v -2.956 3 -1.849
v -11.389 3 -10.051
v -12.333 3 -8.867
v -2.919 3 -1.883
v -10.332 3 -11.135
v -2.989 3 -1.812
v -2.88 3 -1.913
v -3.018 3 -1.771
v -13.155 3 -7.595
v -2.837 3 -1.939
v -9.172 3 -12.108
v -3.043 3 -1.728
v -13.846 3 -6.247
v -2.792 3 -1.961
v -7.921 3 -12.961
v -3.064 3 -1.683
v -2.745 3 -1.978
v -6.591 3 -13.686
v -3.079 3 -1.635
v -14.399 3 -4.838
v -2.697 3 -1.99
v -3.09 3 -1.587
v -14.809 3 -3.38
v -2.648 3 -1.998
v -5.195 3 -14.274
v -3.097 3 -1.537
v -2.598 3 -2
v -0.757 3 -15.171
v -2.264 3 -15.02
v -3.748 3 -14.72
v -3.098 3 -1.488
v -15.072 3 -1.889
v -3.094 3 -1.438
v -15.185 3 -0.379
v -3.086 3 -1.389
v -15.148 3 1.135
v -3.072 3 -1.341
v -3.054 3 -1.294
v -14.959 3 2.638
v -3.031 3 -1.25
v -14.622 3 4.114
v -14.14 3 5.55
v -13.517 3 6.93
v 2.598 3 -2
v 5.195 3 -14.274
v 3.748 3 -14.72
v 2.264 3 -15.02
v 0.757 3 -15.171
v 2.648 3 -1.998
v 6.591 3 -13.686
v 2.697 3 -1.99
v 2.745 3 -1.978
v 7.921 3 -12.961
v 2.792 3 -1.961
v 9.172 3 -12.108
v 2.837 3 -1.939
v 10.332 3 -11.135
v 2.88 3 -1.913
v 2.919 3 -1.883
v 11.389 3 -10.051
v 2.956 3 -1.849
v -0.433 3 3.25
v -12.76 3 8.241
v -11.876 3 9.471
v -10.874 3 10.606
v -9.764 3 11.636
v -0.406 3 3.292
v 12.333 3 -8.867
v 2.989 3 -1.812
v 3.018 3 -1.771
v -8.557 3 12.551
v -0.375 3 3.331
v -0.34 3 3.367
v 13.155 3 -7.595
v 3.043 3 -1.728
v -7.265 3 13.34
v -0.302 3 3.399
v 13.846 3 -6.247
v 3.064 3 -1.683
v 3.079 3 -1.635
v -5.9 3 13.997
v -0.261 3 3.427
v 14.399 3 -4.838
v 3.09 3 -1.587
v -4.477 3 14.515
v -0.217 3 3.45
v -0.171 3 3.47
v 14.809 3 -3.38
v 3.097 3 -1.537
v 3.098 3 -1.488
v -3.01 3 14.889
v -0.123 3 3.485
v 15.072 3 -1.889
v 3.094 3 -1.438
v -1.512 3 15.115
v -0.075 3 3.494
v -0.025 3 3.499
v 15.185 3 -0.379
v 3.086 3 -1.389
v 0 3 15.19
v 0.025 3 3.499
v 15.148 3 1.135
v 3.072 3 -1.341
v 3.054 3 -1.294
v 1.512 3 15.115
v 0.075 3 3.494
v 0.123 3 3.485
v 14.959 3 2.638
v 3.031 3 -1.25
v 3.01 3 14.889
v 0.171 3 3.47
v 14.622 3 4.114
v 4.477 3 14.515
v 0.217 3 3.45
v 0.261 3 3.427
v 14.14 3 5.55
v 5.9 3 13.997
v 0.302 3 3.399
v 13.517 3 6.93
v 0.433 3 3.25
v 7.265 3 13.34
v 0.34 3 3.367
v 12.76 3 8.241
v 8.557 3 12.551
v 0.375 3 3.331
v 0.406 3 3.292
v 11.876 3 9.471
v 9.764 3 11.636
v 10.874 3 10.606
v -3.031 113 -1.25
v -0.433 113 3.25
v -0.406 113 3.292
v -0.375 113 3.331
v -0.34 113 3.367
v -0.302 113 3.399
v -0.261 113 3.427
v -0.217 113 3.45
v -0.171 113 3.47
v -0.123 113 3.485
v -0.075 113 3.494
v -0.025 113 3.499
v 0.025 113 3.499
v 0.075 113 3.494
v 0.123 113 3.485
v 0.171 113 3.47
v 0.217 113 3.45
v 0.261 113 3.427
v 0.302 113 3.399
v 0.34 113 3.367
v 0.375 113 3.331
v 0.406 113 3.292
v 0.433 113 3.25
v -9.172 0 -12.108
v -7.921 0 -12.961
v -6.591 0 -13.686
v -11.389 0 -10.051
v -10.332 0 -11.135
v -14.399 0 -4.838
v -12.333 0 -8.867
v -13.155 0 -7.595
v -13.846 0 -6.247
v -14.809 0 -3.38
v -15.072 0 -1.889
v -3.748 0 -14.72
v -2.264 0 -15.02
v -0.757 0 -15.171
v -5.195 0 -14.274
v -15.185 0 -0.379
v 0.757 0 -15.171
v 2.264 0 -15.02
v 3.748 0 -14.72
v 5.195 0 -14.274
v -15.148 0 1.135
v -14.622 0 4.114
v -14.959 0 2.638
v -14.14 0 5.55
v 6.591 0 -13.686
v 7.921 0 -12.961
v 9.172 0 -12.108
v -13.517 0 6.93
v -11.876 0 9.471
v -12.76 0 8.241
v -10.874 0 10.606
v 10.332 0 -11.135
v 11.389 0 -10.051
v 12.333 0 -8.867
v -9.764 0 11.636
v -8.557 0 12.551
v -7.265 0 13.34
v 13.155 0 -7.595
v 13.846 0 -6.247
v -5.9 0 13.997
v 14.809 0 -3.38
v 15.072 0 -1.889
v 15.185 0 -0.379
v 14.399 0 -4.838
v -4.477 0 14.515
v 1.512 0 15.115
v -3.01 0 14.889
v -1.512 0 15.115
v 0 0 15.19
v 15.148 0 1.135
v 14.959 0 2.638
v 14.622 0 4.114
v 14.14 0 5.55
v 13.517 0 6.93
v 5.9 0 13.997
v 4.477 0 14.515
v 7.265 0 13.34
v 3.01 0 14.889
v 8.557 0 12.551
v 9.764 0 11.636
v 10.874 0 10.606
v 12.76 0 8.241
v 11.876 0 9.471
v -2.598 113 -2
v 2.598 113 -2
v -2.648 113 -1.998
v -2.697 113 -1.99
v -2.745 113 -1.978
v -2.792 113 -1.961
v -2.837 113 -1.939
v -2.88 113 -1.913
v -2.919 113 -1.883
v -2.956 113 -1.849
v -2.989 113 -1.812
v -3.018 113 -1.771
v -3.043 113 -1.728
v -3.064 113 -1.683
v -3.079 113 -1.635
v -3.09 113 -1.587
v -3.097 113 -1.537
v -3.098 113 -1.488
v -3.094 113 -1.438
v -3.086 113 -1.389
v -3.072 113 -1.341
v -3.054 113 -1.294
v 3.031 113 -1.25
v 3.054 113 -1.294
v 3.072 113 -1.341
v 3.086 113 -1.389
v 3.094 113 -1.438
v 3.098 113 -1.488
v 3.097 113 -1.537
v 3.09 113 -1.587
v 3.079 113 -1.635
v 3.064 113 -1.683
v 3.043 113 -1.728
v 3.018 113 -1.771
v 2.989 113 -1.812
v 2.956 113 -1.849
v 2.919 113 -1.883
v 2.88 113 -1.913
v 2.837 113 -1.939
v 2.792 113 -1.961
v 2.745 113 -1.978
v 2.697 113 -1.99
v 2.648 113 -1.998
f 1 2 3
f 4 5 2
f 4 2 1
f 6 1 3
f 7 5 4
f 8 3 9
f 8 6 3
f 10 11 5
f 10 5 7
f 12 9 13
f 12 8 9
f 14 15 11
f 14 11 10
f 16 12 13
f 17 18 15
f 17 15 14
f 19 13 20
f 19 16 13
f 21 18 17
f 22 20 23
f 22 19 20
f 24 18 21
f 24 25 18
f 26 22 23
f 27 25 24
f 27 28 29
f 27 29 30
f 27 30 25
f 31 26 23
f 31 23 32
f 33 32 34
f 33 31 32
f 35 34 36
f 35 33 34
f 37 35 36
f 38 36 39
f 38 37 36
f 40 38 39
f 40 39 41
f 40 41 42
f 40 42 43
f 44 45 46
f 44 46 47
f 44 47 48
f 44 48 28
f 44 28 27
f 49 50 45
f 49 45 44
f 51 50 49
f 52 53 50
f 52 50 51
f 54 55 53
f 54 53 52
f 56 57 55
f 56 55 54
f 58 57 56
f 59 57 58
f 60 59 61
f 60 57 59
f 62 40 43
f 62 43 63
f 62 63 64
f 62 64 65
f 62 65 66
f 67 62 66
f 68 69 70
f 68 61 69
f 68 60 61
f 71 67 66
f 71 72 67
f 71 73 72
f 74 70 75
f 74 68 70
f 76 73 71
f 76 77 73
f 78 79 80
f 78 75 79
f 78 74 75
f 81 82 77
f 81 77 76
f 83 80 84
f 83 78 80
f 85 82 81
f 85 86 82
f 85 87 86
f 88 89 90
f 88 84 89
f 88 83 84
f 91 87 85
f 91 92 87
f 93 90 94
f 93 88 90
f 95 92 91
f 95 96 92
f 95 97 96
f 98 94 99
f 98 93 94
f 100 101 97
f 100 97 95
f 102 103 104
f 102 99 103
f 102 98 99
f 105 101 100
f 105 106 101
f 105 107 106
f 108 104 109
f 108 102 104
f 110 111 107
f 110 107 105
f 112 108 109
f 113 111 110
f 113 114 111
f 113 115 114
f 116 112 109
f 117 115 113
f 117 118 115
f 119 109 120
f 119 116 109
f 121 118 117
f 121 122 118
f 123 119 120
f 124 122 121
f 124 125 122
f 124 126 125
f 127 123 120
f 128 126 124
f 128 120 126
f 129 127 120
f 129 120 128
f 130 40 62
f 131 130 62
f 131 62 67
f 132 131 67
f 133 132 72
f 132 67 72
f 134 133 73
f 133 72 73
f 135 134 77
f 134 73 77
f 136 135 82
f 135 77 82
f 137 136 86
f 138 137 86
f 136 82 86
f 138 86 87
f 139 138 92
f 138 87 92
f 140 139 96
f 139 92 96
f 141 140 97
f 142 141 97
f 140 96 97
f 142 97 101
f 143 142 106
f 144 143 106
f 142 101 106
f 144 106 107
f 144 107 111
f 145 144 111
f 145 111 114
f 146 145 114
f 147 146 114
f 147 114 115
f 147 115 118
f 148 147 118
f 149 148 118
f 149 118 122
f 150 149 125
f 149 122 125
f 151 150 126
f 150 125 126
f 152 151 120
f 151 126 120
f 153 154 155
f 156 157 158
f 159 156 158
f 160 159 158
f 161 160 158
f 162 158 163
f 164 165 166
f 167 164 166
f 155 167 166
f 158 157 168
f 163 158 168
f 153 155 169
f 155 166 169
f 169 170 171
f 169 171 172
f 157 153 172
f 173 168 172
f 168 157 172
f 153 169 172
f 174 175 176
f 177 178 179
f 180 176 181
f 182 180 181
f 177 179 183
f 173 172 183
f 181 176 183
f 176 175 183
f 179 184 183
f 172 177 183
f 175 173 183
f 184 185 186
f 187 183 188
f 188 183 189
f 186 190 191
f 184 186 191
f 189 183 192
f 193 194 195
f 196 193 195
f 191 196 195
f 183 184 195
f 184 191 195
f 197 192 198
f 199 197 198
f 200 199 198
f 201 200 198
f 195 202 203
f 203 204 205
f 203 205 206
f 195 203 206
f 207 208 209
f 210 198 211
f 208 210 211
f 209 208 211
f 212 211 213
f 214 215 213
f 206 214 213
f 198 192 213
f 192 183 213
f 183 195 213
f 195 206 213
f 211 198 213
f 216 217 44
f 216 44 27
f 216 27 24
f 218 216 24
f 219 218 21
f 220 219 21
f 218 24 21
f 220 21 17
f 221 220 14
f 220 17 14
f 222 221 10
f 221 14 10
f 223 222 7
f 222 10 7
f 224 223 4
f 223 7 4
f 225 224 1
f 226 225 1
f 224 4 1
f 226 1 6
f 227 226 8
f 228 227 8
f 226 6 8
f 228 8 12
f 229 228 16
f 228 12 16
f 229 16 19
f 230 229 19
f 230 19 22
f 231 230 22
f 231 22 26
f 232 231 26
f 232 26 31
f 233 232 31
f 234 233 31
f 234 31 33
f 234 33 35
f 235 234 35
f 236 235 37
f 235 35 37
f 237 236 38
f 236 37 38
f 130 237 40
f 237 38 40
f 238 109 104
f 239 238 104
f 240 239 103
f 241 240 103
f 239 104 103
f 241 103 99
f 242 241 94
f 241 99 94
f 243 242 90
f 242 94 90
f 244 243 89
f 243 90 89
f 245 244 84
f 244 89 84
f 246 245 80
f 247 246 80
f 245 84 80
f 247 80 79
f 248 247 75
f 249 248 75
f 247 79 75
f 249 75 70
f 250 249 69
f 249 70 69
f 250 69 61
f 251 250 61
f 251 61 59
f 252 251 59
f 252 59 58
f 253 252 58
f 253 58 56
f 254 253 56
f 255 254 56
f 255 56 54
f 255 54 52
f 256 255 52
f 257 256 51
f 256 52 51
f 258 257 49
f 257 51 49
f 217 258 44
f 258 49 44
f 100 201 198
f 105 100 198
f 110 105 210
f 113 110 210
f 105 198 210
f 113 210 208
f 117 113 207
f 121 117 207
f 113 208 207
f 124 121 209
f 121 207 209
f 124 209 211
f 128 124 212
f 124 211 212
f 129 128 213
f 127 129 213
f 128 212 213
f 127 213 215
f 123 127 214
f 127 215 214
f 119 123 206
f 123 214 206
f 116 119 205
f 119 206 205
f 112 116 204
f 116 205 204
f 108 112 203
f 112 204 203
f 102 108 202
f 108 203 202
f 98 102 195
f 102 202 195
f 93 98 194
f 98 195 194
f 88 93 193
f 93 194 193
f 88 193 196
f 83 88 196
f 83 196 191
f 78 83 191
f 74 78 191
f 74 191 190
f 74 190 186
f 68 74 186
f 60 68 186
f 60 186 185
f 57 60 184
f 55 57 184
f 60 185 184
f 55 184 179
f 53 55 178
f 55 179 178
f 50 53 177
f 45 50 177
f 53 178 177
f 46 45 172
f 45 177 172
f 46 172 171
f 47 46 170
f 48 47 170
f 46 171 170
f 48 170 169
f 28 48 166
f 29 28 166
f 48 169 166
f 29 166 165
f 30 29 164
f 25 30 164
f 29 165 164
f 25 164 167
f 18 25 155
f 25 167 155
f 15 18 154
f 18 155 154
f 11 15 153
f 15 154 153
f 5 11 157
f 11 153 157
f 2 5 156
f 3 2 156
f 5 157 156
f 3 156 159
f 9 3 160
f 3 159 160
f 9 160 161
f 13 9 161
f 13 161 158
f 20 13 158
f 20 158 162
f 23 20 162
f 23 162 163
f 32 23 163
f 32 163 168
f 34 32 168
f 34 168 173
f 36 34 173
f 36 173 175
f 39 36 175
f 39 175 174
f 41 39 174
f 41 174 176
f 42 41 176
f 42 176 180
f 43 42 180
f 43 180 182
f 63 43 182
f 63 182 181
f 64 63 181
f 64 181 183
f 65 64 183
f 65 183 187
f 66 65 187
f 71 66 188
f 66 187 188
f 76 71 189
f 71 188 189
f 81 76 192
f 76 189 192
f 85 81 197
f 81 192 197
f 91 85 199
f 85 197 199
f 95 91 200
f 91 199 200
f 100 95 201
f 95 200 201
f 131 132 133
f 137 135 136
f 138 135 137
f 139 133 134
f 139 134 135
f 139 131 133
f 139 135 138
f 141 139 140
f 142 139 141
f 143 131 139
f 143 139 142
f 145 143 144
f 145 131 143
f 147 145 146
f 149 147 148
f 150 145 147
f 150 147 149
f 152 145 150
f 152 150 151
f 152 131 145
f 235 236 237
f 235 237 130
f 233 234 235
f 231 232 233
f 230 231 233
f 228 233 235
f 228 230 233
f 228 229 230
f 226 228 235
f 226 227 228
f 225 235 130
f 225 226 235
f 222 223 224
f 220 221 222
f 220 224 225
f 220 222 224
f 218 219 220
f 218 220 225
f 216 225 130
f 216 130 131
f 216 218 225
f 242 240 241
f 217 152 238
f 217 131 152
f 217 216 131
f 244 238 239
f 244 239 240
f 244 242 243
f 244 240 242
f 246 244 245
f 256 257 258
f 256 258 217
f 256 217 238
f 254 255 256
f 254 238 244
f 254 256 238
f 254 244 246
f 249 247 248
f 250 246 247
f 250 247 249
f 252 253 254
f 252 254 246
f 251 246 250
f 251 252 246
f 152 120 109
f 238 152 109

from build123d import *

# Parameters (mm, degrees)
SKETCH1_R           = 15.19
BOSS_EXTRUDE1_DEPTH = 3
BOSS_EXTRUDE2_DEPTH = 110


with BuildPart() as part:
    # Sketch1 → Boss-Extrude1 (new body)
    with BuildSketch(Plane(origin=(0, 0, 0), x_dir=(1, 0, 0), z_dir=(0, 1, 0))):
        with Locations(Location((0, 0, 0), (0, 0, 270))):
            Circle(SKETCH1_R)
    extrude(amount=BOSS_EXTRUDE1_DEPTH)

    # Sketch2 → Boss-Extrude2 (add)
    with BuildSketch(Plane(origin=(0, 3, 0), x_dir=(1, 0, 0), z_dir=(0, 1, 0))):
        with BuildLine():
            Line((0.433012702, -3.25), (3.031088913, 1.25))
            ThreePointArc((3.031088913, 1.25), (3.031088913, 1.75), (2.598076211, 2))
            Line((2.598076211, 2), (-2.598076211, 2))
            ThreePointArc((-2.598076211, 2), (-3.031088913, 1.75), (-3.031088913, 1.25))
            Line((-3.031088913, 1.25), (-0.433012702, -3.25))
            ThreePointArc((-0.433012702, -3.25), (0, -3.5), (0.433012702, -3.25))
        make_face()
    extrude(amount=BOSS_EXTRUDE2_DEPTH)


solid = part.part
